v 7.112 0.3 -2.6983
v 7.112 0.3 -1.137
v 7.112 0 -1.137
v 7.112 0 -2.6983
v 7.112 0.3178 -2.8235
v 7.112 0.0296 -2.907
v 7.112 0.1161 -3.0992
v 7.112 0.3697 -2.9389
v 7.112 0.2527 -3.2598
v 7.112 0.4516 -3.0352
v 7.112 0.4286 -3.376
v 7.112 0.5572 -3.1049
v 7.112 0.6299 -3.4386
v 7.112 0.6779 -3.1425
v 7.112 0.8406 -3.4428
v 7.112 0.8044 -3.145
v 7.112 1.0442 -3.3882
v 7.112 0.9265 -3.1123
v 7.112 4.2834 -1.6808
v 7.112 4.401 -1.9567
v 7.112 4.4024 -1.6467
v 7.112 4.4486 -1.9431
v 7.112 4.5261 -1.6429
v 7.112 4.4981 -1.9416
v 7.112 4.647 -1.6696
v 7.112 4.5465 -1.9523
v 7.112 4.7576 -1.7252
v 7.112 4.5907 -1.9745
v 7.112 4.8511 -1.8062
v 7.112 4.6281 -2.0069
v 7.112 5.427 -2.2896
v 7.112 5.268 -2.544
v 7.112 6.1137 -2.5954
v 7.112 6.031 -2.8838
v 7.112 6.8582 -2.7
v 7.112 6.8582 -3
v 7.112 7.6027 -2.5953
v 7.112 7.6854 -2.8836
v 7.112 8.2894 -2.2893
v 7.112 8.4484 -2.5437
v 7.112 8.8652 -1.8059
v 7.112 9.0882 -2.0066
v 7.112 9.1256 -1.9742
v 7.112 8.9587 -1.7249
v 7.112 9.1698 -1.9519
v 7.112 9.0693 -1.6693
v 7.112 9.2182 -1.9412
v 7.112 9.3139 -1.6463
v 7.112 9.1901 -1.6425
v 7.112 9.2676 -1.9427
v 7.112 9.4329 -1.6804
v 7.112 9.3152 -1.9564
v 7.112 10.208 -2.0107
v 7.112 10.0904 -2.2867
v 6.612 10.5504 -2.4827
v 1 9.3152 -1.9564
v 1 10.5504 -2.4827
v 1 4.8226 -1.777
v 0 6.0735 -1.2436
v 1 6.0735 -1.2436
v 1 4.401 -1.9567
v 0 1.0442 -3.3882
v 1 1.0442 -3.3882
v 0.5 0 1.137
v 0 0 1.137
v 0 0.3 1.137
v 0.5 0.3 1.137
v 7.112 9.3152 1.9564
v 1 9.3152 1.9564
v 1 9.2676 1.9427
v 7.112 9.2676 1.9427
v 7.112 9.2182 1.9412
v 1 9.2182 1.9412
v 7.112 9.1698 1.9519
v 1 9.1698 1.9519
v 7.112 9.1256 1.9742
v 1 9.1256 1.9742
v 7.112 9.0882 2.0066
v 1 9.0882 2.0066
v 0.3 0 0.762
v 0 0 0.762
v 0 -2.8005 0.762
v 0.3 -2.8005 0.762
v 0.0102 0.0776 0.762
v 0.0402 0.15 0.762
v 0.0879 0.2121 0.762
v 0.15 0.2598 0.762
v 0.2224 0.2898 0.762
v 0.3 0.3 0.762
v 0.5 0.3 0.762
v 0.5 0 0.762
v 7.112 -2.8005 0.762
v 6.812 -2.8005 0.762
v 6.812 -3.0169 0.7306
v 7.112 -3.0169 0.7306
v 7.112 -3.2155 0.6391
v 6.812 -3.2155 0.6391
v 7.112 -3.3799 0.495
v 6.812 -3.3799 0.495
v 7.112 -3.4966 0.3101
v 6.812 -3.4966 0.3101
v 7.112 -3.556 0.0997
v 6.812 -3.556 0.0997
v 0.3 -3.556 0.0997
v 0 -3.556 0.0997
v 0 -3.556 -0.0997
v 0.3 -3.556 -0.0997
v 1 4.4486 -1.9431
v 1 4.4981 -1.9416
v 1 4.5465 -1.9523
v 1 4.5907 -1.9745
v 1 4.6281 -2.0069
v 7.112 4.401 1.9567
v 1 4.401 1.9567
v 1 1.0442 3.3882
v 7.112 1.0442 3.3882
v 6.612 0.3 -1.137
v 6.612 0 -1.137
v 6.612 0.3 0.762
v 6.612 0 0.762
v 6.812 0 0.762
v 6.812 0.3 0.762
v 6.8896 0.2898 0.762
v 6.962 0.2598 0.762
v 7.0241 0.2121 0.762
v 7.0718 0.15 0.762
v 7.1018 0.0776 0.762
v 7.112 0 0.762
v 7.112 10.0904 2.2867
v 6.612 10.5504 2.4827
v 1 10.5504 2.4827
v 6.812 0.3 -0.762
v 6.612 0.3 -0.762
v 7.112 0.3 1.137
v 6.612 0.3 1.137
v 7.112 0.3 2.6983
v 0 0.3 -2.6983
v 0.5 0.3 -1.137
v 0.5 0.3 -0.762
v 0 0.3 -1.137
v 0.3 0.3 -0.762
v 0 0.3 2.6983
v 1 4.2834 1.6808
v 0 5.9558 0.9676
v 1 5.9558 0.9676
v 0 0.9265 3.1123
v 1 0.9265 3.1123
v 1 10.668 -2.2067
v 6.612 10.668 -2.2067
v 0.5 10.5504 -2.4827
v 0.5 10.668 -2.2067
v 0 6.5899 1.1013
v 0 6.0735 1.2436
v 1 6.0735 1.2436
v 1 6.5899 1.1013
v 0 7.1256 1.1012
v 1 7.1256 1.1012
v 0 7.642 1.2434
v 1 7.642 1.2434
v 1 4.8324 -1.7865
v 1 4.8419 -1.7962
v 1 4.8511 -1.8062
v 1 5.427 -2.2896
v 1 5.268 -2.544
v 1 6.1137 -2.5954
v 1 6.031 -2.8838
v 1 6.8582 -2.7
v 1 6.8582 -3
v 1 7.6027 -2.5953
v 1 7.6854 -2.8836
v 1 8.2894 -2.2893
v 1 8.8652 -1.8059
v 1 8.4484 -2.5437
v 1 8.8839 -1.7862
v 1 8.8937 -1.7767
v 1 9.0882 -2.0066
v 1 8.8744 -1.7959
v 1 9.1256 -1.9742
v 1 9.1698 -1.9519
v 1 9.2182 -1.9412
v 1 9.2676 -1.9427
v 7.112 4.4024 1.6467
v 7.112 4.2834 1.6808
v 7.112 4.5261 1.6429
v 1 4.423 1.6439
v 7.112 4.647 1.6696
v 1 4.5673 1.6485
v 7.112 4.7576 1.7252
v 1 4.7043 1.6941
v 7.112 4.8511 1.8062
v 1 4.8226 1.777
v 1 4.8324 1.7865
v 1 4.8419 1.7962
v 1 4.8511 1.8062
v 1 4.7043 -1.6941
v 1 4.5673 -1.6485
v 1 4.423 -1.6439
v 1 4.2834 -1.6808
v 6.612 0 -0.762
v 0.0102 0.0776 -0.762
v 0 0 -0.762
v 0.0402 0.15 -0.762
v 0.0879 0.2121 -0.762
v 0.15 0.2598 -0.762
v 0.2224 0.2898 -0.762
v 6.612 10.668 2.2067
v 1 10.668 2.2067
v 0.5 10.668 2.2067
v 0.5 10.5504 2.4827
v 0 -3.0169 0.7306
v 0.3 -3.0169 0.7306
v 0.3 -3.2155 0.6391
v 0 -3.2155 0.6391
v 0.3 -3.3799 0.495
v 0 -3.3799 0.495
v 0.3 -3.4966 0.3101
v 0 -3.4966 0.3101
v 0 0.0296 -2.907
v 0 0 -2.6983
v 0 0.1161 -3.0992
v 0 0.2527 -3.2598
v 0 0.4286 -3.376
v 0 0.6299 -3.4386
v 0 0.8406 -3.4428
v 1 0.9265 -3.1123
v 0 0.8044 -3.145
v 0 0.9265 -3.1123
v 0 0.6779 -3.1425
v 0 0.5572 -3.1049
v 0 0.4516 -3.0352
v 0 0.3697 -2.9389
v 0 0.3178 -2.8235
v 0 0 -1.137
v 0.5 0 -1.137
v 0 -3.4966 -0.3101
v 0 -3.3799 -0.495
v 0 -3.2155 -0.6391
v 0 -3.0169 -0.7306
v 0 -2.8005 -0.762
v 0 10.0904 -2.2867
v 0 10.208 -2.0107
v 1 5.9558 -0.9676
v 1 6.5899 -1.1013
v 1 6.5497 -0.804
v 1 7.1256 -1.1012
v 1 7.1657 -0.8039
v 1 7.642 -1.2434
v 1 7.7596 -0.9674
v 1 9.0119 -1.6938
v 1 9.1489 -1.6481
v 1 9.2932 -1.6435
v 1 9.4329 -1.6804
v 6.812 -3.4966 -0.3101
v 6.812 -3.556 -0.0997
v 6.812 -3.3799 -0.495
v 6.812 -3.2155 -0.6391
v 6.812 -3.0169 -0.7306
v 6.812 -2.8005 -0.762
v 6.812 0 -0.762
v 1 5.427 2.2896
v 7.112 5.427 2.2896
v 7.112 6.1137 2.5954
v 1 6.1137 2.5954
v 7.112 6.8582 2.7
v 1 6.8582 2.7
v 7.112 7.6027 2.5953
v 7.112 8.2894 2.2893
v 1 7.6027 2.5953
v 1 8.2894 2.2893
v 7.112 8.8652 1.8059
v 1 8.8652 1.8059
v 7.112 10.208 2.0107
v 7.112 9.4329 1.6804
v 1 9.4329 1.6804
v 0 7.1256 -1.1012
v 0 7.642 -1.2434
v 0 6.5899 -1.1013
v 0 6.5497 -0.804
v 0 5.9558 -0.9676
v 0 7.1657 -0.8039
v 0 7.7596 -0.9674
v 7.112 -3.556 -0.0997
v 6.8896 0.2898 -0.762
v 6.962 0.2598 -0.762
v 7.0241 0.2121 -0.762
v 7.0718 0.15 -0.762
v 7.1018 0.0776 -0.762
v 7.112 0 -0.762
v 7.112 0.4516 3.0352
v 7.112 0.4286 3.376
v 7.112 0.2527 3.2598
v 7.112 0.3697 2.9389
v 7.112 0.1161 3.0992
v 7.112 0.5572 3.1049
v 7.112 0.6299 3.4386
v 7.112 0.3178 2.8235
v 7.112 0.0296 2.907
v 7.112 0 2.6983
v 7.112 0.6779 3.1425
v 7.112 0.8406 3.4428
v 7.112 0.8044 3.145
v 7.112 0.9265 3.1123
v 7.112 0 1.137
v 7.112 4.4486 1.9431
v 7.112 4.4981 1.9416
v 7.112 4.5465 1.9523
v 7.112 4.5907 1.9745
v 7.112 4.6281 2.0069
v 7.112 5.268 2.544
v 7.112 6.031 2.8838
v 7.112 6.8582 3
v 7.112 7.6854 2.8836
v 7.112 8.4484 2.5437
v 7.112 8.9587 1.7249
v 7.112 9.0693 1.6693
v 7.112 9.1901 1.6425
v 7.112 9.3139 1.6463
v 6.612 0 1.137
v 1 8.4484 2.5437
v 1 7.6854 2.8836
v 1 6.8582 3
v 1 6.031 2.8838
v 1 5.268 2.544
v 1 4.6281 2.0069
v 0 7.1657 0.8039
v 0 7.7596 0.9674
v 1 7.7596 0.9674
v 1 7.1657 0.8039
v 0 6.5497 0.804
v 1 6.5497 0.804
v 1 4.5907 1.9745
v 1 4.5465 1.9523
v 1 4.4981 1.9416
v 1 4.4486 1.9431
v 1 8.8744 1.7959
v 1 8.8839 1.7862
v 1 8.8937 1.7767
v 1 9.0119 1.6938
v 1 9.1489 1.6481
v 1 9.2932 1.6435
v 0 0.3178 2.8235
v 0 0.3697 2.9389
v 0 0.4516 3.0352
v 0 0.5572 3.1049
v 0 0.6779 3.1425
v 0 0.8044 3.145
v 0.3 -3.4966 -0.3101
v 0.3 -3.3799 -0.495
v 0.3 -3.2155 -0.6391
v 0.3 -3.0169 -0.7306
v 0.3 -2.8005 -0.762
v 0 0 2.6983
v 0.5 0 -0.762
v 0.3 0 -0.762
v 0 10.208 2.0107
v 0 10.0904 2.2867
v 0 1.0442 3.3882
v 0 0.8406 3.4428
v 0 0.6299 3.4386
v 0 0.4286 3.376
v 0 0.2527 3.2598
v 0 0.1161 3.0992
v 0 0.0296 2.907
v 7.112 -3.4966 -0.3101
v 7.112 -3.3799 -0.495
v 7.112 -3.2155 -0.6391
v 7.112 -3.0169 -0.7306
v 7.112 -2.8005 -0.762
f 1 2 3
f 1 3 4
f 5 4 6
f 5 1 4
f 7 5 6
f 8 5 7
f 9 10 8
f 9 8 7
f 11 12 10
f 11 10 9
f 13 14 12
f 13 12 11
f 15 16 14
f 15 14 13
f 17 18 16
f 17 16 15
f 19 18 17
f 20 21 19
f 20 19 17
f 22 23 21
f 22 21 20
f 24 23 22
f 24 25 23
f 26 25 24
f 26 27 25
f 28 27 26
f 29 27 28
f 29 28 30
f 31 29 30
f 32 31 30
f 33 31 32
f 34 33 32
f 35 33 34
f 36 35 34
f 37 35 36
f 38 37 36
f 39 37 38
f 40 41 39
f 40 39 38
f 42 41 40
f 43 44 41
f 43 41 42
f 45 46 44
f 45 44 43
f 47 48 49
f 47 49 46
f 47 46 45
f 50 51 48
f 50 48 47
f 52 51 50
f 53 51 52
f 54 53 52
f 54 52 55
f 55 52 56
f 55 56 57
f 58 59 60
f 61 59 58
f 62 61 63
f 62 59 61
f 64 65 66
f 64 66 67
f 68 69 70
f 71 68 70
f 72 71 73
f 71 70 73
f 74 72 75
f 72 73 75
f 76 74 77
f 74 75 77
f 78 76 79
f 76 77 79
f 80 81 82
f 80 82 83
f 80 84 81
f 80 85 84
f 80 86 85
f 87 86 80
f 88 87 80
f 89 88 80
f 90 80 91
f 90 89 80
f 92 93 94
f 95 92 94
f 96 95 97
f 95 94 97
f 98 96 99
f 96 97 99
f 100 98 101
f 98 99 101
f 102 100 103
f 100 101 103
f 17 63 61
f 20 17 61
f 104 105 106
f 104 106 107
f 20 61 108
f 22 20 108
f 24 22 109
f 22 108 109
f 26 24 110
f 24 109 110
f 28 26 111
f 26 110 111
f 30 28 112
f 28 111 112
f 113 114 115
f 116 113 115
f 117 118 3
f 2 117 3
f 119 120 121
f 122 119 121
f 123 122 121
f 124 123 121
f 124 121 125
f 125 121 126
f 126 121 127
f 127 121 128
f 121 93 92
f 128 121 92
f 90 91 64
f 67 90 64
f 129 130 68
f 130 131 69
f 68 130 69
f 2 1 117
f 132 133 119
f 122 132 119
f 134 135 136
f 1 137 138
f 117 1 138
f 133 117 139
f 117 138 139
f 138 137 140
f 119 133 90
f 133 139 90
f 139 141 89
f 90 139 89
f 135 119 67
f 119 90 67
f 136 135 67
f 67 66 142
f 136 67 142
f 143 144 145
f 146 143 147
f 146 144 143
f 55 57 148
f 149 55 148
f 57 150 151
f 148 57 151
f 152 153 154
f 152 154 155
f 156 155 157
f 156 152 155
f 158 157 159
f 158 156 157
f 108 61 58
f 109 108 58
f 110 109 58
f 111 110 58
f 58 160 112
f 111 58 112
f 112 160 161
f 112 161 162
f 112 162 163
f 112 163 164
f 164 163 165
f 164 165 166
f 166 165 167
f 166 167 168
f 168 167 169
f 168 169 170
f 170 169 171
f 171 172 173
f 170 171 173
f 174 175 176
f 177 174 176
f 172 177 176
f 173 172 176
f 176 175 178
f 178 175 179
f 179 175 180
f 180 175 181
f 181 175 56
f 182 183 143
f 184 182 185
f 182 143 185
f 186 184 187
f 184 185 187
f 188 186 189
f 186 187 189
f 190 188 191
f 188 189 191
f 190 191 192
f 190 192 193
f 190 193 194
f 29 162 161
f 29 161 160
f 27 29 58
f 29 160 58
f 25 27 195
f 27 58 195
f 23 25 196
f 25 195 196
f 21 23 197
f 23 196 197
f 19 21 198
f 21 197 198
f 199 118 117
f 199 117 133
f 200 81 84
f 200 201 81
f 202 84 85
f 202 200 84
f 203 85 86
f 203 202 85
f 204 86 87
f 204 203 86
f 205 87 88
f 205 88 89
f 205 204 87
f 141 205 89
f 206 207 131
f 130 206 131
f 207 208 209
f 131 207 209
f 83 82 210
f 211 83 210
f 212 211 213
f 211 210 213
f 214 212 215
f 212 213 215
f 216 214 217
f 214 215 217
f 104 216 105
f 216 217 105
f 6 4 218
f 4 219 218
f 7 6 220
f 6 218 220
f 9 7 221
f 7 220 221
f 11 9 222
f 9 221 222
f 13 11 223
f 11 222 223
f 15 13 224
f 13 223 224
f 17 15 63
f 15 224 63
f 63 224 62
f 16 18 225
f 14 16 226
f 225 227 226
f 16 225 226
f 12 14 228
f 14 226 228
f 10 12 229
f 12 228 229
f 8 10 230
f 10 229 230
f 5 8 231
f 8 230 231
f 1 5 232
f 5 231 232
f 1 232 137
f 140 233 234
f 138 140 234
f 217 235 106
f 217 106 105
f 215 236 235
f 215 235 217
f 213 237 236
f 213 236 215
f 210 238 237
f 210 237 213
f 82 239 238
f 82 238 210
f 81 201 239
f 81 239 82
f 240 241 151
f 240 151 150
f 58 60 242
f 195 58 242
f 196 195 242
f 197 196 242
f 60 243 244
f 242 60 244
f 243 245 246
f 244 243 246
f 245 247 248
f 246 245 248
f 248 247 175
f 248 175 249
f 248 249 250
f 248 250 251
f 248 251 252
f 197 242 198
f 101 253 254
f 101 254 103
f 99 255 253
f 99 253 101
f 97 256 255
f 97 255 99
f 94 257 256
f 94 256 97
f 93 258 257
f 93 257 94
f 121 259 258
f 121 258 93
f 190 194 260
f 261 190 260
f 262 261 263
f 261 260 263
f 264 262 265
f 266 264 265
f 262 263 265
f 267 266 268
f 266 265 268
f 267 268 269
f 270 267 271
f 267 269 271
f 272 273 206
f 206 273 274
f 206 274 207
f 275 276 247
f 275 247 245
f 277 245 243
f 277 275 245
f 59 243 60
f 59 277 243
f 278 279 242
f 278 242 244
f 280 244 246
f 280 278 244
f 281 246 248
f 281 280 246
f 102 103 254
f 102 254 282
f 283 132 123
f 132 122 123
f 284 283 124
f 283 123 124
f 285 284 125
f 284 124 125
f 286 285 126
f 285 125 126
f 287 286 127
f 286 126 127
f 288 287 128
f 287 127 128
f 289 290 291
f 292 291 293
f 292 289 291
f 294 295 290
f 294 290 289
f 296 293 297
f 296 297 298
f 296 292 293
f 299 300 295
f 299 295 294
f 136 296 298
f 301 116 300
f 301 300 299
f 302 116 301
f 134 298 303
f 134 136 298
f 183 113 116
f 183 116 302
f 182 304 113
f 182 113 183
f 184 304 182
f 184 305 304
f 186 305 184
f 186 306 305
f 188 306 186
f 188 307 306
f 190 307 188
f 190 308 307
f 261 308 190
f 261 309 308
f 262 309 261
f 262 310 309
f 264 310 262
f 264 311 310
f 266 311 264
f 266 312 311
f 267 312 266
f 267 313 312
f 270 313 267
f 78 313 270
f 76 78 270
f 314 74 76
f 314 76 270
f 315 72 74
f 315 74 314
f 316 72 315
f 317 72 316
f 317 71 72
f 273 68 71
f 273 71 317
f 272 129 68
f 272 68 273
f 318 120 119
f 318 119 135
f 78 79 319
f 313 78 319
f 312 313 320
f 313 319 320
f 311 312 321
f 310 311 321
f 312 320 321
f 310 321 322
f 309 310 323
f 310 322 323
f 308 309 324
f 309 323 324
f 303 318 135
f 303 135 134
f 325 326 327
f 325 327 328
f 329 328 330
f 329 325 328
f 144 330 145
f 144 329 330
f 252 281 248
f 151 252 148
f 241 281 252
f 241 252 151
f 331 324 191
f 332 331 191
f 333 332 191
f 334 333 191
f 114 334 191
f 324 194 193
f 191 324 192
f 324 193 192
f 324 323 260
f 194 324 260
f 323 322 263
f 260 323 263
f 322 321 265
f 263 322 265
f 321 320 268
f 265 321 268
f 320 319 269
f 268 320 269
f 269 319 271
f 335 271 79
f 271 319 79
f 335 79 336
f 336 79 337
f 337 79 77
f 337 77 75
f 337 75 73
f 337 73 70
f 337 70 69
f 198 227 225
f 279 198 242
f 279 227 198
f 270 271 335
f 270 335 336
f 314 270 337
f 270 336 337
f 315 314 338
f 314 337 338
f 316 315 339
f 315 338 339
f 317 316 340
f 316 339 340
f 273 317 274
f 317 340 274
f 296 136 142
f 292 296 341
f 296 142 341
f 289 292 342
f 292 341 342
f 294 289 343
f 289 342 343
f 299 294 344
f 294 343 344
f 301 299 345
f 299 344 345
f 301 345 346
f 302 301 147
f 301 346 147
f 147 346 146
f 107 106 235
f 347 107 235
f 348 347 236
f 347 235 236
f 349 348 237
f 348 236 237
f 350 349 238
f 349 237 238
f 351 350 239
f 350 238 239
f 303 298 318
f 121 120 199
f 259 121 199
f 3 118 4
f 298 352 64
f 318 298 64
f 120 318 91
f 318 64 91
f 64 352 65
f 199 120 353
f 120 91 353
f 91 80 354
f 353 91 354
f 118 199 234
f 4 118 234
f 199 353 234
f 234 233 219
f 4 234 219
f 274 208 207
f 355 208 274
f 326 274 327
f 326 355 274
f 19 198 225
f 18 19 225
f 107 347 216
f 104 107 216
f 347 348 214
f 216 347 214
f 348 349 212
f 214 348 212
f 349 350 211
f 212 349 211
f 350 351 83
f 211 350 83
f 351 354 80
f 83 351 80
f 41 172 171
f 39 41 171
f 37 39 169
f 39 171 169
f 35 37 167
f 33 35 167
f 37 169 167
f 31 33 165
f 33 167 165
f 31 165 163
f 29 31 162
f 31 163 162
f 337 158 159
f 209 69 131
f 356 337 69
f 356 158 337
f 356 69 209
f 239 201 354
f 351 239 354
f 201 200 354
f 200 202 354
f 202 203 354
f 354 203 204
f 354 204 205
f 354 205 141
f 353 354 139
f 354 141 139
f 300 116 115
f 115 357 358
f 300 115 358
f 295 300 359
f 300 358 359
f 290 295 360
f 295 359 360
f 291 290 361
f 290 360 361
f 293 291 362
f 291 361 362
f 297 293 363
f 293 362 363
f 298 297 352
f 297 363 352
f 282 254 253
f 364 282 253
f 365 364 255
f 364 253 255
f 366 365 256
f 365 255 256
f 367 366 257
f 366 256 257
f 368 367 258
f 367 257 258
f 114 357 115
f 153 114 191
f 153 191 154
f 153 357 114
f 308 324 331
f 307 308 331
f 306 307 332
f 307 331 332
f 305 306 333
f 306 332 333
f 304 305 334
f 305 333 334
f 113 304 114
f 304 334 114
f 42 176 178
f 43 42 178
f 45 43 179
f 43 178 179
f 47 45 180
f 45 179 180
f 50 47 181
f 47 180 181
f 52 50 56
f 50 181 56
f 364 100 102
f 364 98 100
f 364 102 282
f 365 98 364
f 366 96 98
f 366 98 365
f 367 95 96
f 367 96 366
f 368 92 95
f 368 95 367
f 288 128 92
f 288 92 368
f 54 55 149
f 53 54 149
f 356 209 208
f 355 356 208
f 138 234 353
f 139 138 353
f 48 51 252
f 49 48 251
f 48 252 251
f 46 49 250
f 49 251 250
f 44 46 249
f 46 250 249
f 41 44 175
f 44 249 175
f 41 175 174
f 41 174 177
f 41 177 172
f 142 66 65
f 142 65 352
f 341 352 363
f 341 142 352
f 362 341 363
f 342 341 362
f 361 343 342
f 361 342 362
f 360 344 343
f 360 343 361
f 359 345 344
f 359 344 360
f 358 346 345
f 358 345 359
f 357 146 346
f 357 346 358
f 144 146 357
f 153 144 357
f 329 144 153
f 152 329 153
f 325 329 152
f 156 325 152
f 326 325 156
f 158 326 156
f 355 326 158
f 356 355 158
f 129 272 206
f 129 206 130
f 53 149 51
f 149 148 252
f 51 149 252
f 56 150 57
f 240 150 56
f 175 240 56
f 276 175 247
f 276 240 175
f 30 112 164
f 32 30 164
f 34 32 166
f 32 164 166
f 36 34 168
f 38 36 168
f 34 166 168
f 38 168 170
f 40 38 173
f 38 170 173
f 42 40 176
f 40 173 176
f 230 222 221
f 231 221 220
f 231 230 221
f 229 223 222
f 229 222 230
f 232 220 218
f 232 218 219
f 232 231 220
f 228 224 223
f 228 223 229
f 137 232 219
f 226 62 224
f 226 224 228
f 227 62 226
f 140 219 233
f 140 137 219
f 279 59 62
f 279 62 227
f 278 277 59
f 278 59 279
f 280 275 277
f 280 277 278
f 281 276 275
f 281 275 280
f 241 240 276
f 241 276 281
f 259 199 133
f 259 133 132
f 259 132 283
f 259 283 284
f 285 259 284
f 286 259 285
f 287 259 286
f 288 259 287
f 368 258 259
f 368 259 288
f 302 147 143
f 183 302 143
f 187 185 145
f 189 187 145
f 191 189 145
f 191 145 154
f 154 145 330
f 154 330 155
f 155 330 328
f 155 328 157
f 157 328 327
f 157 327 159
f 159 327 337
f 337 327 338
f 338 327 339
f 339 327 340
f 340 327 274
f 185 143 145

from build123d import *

# Parameters (mm, degrees)
BOSS_EXTRUDE1_DEPTH = 1
BOSS_EXTRUDE2_DEPTH = 6.112
CHAMFER1_SIZE       = 0.5
SKETCH3_W           = 0.5
SKETCH3_H           = 0.375
CUT_EXTRUDE1_DEPTH  = 0.3
SKETCH4_W           = 0.3
SKETCH4_H           = 1.524
BOSS_EXTRUDE3_DEPTH = 3.556
CUT_EXTRUDE2_DEPTH  = 14.276962233
FILLET1_R           = 0.3


with BuildPart() as part:
    # Sketch1 → Boss-Extrude1 (new body)
    with BuildSketch(Plane(origin=(0, 0, 0), x_dir=(0, 0, -1), z_dir=(1, 0, 0))):
        with BuildLine():
            Line((0, 0), (-2.698326862, 0))
            ThreePointArc((-2.698326862, 0), (-3.32408446, 0.336566295), (-3.388218281, 1.044193523))
            Line((-3.388218281, 1.044193523), (-1.243555187, 6.073483938))
            ThreePointArc((-1.243555187, 6.073483938), (-1.083265655, 6.857742795), (-1.243353466, 7.642042854))
            Line((-1.243353466, 7.642042854), (-2.482690665, 10.550393572))
            Line((-2.482690665, 10.550393572), (-2.206703839, 10.668))
            Line((-2.206703839, 10.668), (-0.96736664, 7.759649282))
            ThreePointArc((-0.96736664, 7.759649282), (-0.783265658, 6.857704215), (-0.967598619, 5.955806528))
            Line((-0.967598619, 5.955806528), (-3.112261714, 0.926516114))
            ThreePointArc((-3.112261714, 0.926516114), (-3.073781421, 0.501939777), (-2.698326862, 0.3))
            Line((-2.698326862, 0.3), (0, 0.3))
            Line((0, 0.3), (2.698326862, 0.3))
            ThreePointArc((2.698326862, 0.3), (3.073781421, 0.501939777), (3.112261714, 0.926516114))
            Line((3.112261714, 0.926516114), (0.967598619, 5.955806528))
            ThreePointArc((0.967598619, 5.955806528), (0.783265658, 6.857704215), (0.96736664, 7.759649282))
            Line((0.96736664, 7.759649282), (2.206703839, 10.668))
            Line((2.206703839, 10.668), (2.482690665, 10.550393572))
            Line((2.482690665, 10.550393572), (1.243353466, 7.642042854))
            ThreePointArc((1.243353466, 7.642042854), (1.083265655, 6.857742795), (1.243555187, 6.073483938))
            Line((1.243555187, 6.073483938), (3.388218281, 1.044193523))
            ThreePointArc((3.388218281, 1.044193523), (3.32408446, 0.336566295), (2.698326862, 0))
            Line((2.698326862, 0), (0, 0))
        make_face()
    extrude(amount=BOSS_EXTRUDE1_DEPTH)

    # Sketch2 → Boss-Extrude2 (add)
    with BuildSketch(Plane(origin=(1, 0, 0), x_dir=(0, 0, -1), z_dir=(1, 0, 0))):
        with BuildLine():
            Line((-1.956745691, 4.401033762), (-3.388218281, 1.044193523))
            ThreePointArc((-3.388218281, 1.044193523), (-3.32408446, 0.336566295), (-2.698326862, 0))
            Line((-2.698326862, 0), (2.698326862, 0))
            ThreePointArc((2.698326862, 0), (3.32408446, 0.336566295), (3.388218281, 1.044193523))
            Line((3.388218281, 1.044193523), (1.956745691, 4.401033762))
            ThreePointArc((1.956745691, 4.401033762), (1.945426233, 4.522631852), (2.006921941, 4.628142533))
            ThreePointArc((2.006921941, 4.628142533), (2.999999991, 6.858231733), (2.00657743, 9.088167487))
            ThreePointArc((2.00657743, 9.088167487), (1.94506764, 9.193658636), (1.956358041, 9.315249605))
            Line((1.956358041, 9.315249605), (2.482690665, 10.550393572))
            Line((2.482690665, 10.550393572), (2.206703839, 10.668))
            Line((2.206703839, 10.668), (1.680371215, 9.432856033))
            ThreePointArc((1.680371215, 9.432856033), (1.652145213, 9.128878611), (1.805919687, 8.865150738))
            ThreePointArc((1.805919687, 8.865150738), (2.699999992, 6.858208559), (1.806229747, 4.851128279))
            ThreePointArc((1.806229747, 4.851128279), (1.652490477, 4.587351579), (1.680789124, 4.283356353))
            Line((1.680789124, 4.283356353), (3.112261714, 0.926516114))
            ThreePointArc((3.112261714, 0.926516114), (3.073781421, 0.501939777), (2.698326862, 0.3))
            Line((2.698326862, 0.3), (-2.698326862, 0.3))
            ThreePointArc((-2.698326862, 0.3), (-3.073781421, 0.501939777), (-3.112261714, 0.926516114))
            Line((-3.112261714, 0.926516114), (-1.680789124, 4.283356353))
            ThreePointArc((-1.680789124, 4.283356353), (-1.652490477, 4.587351579), (-1.806229747, 4.851128279))
            ThreePointArc((-1.806229747, 4.851128279), (-2.699999992, 6.858208559), (-1.805919687, 8.865150738))
            ThreePointArc((-1.805919687, 8.865150738), (-1.652145213, 9.128878611), (-1.680371215, 9.432856033))
            Line((-1.680371215, 9.432856033), (-2.206703839, 10.668))
            Line((-2.206703839, 10.668), (-2.482690665, 10.550393572))
            Line((-2.482690665, 10.550393572), (-1.956358041, 9.315249605))
            ThreePointArc((-1.956358041, 9.315249605), (-1.94506764, 9.193658636), (-2.00657743, 9.088167487))
            ThreePointArc((-2.00657743, 9.088167487), (-2.999999991, 6.858231733), (-2.006921941, 4.628142533))
            ThreePointArc((-2.006921941, 4.628142533), (-1.945426233, 4.522631852), (-1.956745691, 4.401033762))
        make_face()
    extrude(amount=BOSS_EXTRUDE2_DEPTH)

    # Chamfer1
    chamfer1_edges = [part.edges().sort_by_distance(p)[0] for p in [
        (0, 10.609196786, 2.344697252),
        (0, 10.609196786, -2.344697252),
        (7.112, 10.609196786, -2.344697252),
        (7.112, 10.609196786, 2.344697252),
    ]]
    chamfer(chamfer1_edges, length=CHAMFER1_SIZE)

    # Sketch3 → Cut-Extrude1 (cut)
    with BuildSketch(Plane.XZ):
        with Locations((0.25, -0.9495)):
            Rectangle(SKETCH3_W, SKETCH3_H)
        with Locations((0.25, 0.9495)):
            Rectangle(SKETCH3_W, SKETCH3_H)
        with Locations((6.862, -0.9495)):
            Rectangle(SKETCH3_W, SKETCH3_H)
        with Locations((6.862, 0.9495)):
            Rectangle(SKETCH3_W, SKETCH3_H)
    extrude(amount=-CUT_EXTRUDE1_DEPTH, mode=Mode.SUBTRACT)

    # Sketch4 → Boss-Extrude3 (add)
    with BuildSketch(Plane.XZ):
        with Locations((0.15, 0)):
            Rectangle(SKETCH4_W, SKETCH4_H)
        with Locations((6.962, 0)):
            Rectangle(SKETCH4_W, SKETCH4_H)
    extrude(amount=BOSS_EXTRUDE3_DEPTH)

    # Sketch5 → Cut-Extrude2 (cut, through all)
    with BuildSketch(Plane.ZY):
        with BuildLine():
            ThreePointArc((-0.09968951, -3.556), (-0.572977926, -3.302883985), (-0.762, -2.80054914))
            Line((-0.762, -2.80054914), (-0.762, -3.556))
            Line((-0.762, -3.556), (-0.09968951, -3.556))
        make_face()
        with BuildLine():
            ThreePointArc((0.762, -2.80054914), (0.572977926, -3.302883985), (0.09968951, -3.556))
            Line((0.09968951, -3.556), (0.762, -3.556))
            Line((0.762, -3.556), (0.762, -2.80054914))
        make_face()
    extrude(amount=-CUT_EXTRUDE2_DEPTH, mode=Mode.SUBTRACT)

    # Fillet1
    fillet1_edges = [part.edges().sort_by_distance(p)[0] for p in [
        (0, 0.3, 0),
        (7.112, 0.3, 0),
    ]]
    fillet(fillet1_edges, radius=FILLET1_R)


solid = part.part
